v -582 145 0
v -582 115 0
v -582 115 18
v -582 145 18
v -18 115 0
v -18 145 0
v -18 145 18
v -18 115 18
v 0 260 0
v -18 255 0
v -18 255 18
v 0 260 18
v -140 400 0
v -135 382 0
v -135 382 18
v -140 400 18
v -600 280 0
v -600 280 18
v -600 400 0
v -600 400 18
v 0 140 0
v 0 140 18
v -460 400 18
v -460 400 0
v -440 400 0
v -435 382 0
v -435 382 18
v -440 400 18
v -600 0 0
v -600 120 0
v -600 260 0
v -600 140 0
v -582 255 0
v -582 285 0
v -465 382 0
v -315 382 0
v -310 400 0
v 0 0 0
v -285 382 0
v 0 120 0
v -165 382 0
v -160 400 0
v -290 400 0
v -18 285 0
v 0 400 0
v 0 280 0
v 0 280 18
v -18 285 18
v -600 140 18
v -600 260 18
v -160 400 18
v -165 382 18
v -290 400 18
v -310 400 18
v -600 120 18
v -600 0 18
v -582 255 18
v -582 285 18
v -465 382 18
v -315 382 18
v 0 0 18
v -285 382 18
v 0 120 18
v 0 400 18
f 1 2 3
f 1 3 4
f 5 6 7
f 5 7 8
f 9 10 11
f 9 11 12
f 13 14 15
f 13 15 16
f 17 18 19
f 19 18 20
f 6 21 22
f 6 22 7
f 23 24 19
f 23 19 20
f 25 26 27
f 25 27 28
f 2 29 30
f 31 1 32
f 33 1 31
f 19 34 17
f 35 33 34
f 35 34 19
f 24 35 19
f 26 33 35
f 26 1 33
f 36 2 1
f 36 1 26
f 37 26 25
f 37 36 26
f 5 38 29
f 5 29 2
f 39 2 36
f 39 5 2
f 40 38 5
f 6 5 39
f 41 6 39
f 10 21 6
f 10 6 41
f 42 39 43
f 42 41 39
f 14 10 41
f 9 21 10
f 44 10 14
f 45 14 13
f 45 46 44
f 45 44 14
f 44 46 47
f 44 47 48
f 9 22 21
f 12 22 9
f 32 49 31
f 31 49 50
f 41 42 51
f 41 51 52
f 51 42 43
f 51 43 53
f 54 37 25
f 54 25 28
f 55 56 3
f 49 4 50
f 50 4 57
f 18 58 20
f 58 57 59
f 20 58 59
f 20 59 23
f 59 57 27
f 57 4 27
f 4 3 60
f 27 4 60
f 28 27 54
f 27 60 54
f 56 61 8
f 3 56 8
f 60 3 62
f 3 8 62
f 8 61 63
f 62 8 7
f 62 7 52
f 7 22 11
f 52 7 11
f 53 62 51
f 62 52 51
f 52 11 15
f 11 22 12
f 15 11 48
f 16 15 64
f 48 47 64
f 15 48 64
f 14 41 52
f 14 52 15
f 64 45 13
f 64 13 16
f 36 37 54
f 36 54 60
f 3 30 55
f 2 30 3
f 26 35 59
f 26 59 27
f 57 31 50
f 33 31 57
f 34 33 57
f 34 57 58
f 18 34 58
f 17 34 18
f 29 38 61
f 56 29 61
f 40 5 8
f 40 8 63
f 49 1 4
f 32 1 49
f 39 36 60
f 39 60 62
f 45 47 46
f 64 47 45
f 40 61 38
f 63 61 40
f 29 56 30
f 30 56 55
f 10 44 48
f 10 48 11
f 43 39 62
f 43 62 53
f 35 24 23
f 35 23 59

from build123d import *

# Parameters (mm, degrees)
F0_W          = 400
F0_H          = 18
F1_DEPTH      = 600
F3_DEPTH      = 18
F3_DEPTH_BACK = 25


with BuildPart() as f1:
    # F0 (on Right) → F1 (new body)
    with BuildSketch(Plane.YZ):
        with Locations((200, 9)):
            Rectangle(F0_W, F0_H)
    extrude(amount=-F1_DEPTH)

    # F2 (on Top) → F3 (cut, two sides)
    with BuildSketch(Plane.XY) as f3_sk:
        Polygon((-300, 400), (-310, 400), (-315, 382), (-300, 382), (-285, 382), (-290, 400), align=None)
        Polygon((-150, 400), (-160, 400), (-165, 382), (-135, 382), (-140, 400), align=None)
        Polygon((-450, 400), (-460, 400), (-465, 382), (-435, 382), (-440, 400), align=None)
        Polygon((-600, 280), (-600, 270), (-600, 260), (-582, 255), (-582, 270), (-582, 285), align=None)
        Polygon((-582, 145), (-600, 140), (-600, 130), (-600, 120), (-582, 115), (-582, 130), align=None)
        Polygon((0, 270), (0, 280), (-18, 285), (-18, 270), (-18, 255), (0, 260), align=None)
        Polygon((-18, 115), (0, 120), (0, 130), (0, 140), (-18, 145), (-18, 130), align=None)
    extrude(amount=F3_DEPTH, mode=Mode.SUBTRACT)
    extrude(f3_sk.sketch, amount=-F3_DEPTH_BACK, mode=Mode.SUBTRACT)


solid = f1.part
